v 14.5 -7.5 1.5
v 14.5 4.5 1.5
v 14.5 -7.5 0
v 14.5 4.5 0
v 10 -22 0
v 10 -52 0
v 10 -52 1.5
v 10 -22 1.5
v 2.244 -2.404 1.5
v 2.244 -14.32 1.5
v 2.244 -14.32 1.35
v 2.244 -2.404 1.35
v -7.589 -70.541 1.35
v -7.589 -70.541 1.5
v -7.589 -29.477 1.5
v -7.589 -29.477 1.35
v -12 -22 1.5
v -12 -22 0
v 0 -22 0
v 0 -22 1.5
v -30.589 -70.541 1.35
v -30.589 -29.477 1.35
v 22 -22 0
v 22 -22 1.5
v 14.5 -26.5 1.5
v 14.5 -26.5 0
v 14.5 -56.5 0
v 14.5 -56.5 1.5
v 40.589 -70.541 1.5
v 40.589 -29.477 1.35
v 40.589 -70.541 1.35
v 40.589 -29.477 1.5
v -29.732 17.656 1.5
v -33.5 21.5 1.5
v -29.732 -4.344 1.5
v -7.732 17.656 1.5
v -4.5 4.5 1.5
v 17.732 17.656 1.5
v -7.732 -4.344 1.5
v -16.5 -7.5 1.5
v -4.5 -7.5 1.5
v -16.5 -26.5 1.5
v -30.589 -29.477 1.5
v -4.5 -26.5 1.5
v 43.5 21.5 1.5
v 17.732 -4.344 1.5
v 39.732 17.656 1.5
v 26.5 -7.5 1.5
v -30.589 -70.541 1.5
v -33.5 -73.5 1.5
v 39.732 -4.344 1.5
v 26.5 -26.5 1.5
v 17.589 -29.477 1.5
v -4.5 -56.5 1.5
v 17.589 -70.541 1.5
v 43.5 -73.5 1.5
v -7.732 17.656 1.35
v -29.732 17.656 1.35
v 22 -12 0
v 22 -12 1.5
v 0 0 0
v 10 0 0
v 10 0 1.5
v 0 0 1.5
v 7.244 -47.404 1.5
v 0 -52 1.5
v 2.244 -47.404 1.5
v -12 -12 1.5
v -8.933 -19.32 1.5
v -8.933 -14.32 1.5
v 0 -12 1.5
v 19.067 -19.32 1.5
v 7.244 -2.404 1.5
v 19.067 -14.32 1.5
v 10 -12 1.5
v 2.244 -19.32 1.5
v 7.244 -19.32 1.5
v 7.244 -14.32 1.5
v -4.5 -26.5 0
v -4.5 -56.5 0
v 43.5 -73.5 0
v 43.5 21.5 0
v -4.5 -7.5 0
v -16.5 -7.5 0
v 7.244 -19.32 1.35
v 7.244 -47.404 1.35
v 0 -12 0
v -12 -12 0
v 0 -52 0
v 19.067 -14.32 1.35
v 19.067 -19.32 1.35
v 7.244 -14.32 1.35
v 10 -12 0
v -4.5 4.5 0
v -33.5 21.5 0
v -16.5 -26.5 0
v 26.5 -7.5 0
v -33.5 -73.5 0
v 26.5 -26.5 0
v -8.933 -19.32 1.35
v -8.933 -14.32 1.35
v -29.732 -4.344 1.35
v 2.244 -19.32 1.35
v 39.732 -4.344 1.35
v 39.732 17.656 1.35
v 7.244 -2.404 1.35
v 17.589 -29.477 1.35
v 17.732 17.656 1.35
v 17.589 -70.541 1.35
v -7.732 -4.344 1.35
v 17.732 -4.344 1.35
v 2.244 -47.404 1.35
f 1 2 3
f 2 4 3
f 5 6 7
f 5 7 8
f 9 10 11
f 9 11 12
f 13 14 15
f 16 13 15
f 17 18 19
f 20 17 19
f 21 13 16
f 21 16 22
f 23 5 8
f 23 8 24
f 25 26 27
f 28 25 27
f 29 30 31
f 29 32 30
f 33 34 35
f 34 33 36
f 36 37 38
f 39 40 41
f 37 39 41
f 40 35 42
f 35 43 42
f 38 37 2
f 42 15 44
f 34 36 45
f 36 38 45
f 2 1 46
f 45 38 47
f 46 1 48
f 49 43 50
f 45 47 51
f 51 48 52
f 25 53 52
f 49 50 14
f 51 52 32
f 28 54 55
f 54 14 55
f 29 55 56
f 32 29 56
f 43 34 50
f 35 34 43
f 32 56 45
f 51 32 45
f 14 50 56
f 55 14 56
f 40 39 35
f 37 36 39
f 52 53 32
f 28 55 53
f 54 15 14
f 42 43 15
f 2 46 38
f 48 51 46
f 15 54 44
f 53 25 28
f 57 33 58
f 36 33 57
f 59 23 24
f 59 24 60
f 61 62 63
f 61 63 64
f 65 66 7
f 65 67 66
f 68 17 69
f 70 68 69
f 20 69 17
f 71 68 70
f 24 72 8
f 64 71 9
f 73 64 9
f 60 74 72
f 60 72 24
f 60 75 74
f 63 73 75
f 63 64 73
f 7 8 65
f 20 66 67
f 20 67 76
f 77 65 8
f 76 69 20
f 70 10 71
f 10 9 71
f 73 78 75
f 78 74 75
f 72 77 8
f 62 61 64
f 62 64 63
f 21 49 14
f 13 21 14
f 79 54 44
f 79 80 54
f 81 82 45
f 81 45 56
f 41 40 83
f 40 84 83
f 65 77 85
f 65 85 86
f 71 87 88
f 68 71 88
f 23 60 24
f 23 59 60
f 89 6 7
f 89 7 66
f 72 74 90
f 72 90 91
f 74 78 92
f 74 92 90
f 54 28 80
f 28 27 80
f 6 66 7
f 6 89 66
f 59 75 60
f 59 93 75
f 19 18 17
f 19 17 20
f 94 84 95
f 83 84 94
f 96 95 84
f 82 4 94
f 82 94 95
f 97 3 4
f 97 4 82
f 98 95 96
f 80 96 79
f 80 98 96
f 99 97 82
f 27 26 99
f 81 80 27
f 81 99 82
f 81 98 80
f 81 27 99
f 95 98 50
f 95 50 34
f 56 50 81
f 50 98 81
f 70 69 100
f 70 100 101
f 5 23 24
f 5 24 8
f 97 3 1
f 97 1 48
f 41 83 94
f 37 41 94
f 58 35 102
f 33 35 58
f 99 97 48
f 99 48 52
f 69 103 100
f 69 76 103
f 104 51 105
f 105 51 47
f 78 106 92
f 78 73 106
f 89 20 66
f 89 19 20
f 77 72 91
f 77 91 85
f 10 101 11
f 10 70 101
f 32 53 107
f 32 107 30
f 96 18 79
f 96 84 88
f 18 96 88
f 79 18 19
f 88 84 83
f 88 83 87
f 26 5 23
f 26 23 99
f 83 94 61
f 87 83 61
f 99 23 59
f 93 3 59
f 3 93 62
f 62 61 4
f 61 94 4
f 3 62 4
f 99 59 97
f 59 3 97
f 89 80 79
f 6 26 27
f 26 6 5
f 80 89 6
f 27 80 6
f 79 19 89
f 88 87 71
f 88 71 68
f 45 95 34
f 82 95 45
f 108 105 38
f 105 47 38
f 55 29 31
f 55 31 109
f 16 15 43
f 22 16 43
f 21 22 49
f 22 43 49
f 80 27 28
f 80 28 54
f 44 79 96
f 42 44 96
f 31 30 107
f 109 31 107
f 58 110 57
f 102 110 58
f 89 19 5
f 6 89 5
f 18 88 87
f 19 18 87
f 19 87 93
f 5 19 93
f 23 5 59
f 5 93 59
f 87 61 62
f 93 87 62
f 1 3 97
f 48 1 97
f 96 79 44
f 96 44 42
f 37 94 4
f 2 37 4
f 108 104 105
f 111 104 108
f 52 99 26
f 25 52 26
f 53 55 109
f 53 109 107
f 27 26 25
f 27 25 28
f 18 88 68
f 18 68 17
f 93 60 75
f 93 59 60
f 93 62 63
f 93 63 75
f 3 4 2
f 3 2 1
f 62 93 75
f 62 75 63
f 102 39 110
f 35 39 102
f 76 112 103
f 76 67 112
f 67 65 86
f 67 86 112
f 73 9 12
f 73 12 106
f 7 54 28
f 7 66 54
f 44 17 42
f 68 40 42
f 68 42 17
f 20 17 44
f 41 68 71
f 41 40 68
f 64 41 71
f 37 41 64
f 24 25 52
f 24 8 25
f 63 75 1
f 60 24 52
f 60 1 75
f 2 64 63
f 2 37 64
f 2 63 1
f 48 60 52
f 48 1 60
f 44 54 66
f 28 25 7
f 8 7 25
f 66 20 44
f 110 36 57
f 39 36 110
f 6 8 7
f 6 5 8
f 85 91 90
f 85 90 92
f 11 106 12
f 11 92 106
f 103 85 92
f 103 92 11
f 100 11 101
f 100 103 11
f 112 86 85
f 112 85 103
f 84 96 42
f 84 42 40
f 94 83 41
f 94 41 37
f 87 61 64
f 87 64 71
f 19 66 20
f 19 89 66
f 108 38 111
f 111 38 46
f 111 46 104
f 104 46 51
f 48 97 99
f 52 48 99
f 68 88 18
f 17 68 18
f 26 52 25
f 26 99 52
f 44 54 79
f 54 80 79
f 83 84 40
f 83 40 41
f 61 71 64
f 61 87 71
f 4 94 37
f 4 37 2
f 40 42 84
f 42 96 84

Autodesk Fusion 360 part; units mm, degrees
sketch "Sketch1" plane through (0, 0, 0) normal (0, 0, 1) x (1, 0, 0)
  line L0 (0, 0) -> (10, 0)
  line L1 (10, 0) -> (10, -12)
  line L2 (10, -12) -> (0, -12)
  line L3 (0, -12) -> (0, 0)
  line L4 (0, -12) -> (-12, -12)
  line L5 (-12, -12) -> (-12, -22)
  line L6 (-12, -22) -> (0, -22)
  line L7 (0, -22) -> (0, -12)
  line L8 (10, -12) -> (22, -12)
  line L9 (22, -12) -> (22, -22)
  line L10 (22, -22) -> (10, -22)
  line L11 (10, -22) -> (10, -12)
  line L12 (0, -22) -> (10, -22)
  line L13 (10, -22) -> (10, -52)
  line L14 (10, -52) -> (0, -52)
  line L15 (0, -52) -> (0, -22)
  dimension "d1" = 10
  dimension "d2" = 12
  dimension "d3" = 12
  dimension "d4" = 10
  dimension "d5" = 12
  dimension "d6" = 10
  dimension "d7" = 30
extrude "Extrude1" add sketch "Sketch1" along normal blind 1.5 makes body 1
sketch "Sketch2" plane through (0, 0, 0) normal (0, 0, -1) x (1, 0, 0)
  line L0 (-12, 12) -> (0, 12)
  line L1 (0, 12) -> (0, 0)
  line L2 (0, 0) -> (10, 0)
  line L3 (10, 0) -> (10, 12)
  line L4 (10, 12) -> (22, 12)
  line L5 (22, 12) -> (22, 22)
  line L6 (22, 22) -> (10, 22)
  line L7 (10, 22) -> (10, 52)
  line L8 (10, 52) -> (0, 52)
  line L9 (0, 52) -> (0, 22)
  line L10 (0, 22) -> (-12, 22)
  line L11 (-12, 22) -> (-12, 12)
  line L12 (26.5, 7.5) -> (26.5, 26.5)
  line L13 (26.5, 26.5) -> (14.5, 26.5)
  line L14 (14.5, 26.5) -> (14.5, 56.5)
  line L15 (14.5, 56.5) -> (-4.5, 56.5)
  line L16 (-4.5, 56.5) -> (-4.5, 26.5)
  line L17 (-4.5, 26.5) -> (-16.5, 26.5)
  line L18 (-16.5, 26.5) -> (-16.5, 7.5)
  line L19 (-16.5, 7.5) -> (-4.5, 7.5)
  line L20 (-4.5, 7.5) -> (-4.5, -4.5)
  line L21 (-4.5, -4.5) -> (14.5, -4.5)
  line L22 (14.5, -4.5) -> (14.5, 7.5)
  line L23 (14.5, 7.5) -> (26.5, 7.5)
  line L24 (-4.5, -4.5) -> (-4.5, -21.5)
  line L25 (14.5, 56.5) -> (14.5, 73.5)
  line L26 (14.5, 73.5) -> (43.5, 73.5)
  line L27 (-4.5, -21.5) -> (-33.5, -21.5)
  line L28 (-33.5, -21.5) -> (43.5, -21.5)
  line L29 (43.5, -21.5) -> (43.5, 73.5)
  line L30 (43.5, 73.5) -> (-33.5, 73.5)
  line L31 (-33.5, 73.5) -> (-33.5, -21.5)
  dimension "d10" = 4.5
  dimension "d11" = 17
  dimension "d13" = 17
  dimension "d14" = 29
  dimension "d15" = 29
extrude "Extrude2" add sketch "Sketch2" against normal blind 1.5 separate body contours L12 L13 L14 L21 L22 L23 L24 L25 L26 L28 L29 L30 | L15 L16 L17 L18 L19 L20 L24 L25 L27 L28 L30 L31 makes body 2
sketch "Sketch3" plane through (0, 0, 1.5) normal (0, 0, 1) x (-1, 0, 0)
  line L0 (-14.5, 7.5) -> (-26.5, 7.5)
  line L1 (-26.5, 7.5) -> (-26.5, 26.5)
  line L2 (-26.5, 26.5) -> (-14.5, 26.5)
  line L3 (-14.5, 26.5) -> (-14.5, 56.5)
  line L4 (-14.5, 56.5) -> (4.5, 56.5)
  line L5 (4.5, 56.5) -> (4.5, 26.5)
  line L6 (4.5, 26.5) -> (16.5, 26.5)
  line L7 (16.5, 26.5) -> (16.5, 7.5)
  line L8 (16.5, 7.5) -> (4.5, 7.5)
  line L9 (4.5, 7.5) -> (4.5, -4.5)
  line L10 (4.5, -4.5) -> (-14.5, -4.5)
  line L11 (-14.5, -4.5) -> (-14.5, 7.5)
  line L12 (33.5, -21.5) -> (33.5, 73.5)
  line L13 (33.5, 73.5) -> (-43.5, 73.5)
  line L14 (-43.5, 73.5) -> (-43.5, -21.5)
  line L15 (-43.5, -21.5) -> (33.5, -21.5)
  line L16 (7.5893, 29.4773) -> (30.5893, 29.4773)
  line L17 (30.5893, 29.4773) -> (30.5893, 70.5409)
  line L18 (30.5893, 70.5409) -> (7.5893, 70.5409)
  line L19 (7.5893, 70.5409) -> (7.5893, 29.4773)
  line L20 (7.732, 4.3436) -> (29.732, 4.3436)
  line L21 (29.732, 4.3436) -> (29.732, -17.6564)
  line L22 (29.732, -17.6564) -> (7.732, -17.6564)
  line L23 (7.732, -17.6564) -> (7.732, 4.3436)
  line L24 (-5, -4.5) -> (-5, -13.4842)
  line L25 (8.9329, 14.3198) -> (-19.0671, 14.3198)
  line L26 (-19.0671, 14.3198) -> (-19.0671, 19.3198)
  line L27 (-19.0671, 19.3198) -> (8.9329, 19.3198)
  line L28 (8.9329, 19.3198) -> (8.9329, 14.3198)
  line L29 (-2.2442, 2.4038) -> (-7.2442, 2.4038)
  line L30 (-7.2442, 2.4038) -> (-7.2442, 47.4038)
  line L31 (-7.2442, 47.4038) -> (-2.2442, 47.4038)
  line L32 (-2.2442, 47.4038) -> (-2.2442, 2.4038)
  line L33 (-17.732, 4.3436) -> (-39.732, 4.3436)
  line L34 (-39.732, 4.3436) -> (-39.732, -17.6564)
  line L35 (-39.732, -17.6564) -> (-17.732, -17.6564)
  line L36 (-17.732, -17.6564) -> (-17.732, 4.3436)
  line L37 (-17.5893, 29.4773) -> (-40.5893, 29.4773)
  line L38 (-17.5893, 70.5409) -> (-17.5893, 29.4773)
  line L39 (-40.5893, 29.4773) -> (-40.5893, 70.5409)
  line L40 (-40.5893, 70.5409) -> (-17.5893, 70.5409)
  dimension "d18" = 23
  dimension "d19" = 22
  dimension "d20" = 22
  dimension "d21" = 28
  dimension "d22" = 5
  dimension "d23" = 5
  dimension "d24" = 45
extrude "Extrude3" cut sketch "Sketch3" against normal blind 0.15 contours L16 L17 L18 L19 | L20 L21 L22 L23 | L25 L27 L28 L32 | L25 L29 L30 L32 | L25 L27 L30 L32 | L25 L26 L27 L30 | L27 L30 L31 L32 | L33 L34 L35 L36 | L37 L38 L39 L40 bodies 1 2
sketch "Sketch4" plane through (0, 0, 0) normal (0, 0, 1) x (1, 0, 0)
  line L0 (0, -12) -> (-12, -12)
  line L1 (0, 0) -> (0, -12)
  line L2 (10, 0) -> (0, 0)
  line L3 (7.2442, -19.3198) -> (7.2442, -47.4038)
  line L4 (7.2442, -47.4038) -> (2.2442, -47.4038)
  line L5 (2.2442, -47.4038) -> (2.2442, -19.3198)
  line L6 (2.2442, -19.3198) -> (-8.9329, -19.3198)
  line L7 (-8.9329, -19.3198) -> (-8.9329, -14.3198)
  line L8 (-8.9329, -14.3198) -> (2.2442, -14.3198)
  line L9 (2.2442, -14.3198) -> (2.2442, -2.4038)
  line L10 (2.2442, -2.4038) -> (7.2442, -2.4038)
  line L11 (7.2442, -2.4038) -> (7.2442, -14.3198)
  line L12 (7.2442, -14.3198) -> (19.0671, -14.3198)
  line L13 (19.0671, -14.3198) -> (19.0671, -19.3198)
  line L14 (19.0671, -19.3198) -> (7.2442, -19.3198)
  line L15 (0, -12) -> (-12, -12)
  line L16 (-12, -12) -> (-12, -22)
  line L17 (-12, -22) -> (0, -22)
  line L18 (0, -22) -> (0, -52)
  line L19 (0, -52) -> (10, -52)
  line L20 (10, -52) -> (10, -22)
  line L21 (10, -22) -> (22, -22)
  line L22 (22, -22) -> (22, -12)
  line L23 (22, -12) -> (10, -12)
  line L24 (10, -12) -> (10, 0)
  line L25 (10, 0) -> (0, 0)
  line L26 (0, 0) -> (0, -12)
  line L27 (39.732, -4.3436) -> (17.732, -4.3436)
  line L28 (17.732, -4.3436) -> (17.732, 17.6564)
  line L29 (17.732, 17.6564) -> (39.732, 17.6564)
  line L30 (39.732, 17.6564) -> (39.732, -4.3436)
  line L31 (-30.5893, -29.4773) -> (-7.5893, -29.4773)
  line L32 (-7.5893, -29.4773) -> (-7.5893, -70.5409)
  line L33 (-7.5893, -70.5409) -> (-30.5893, -70.5409)
  line L34 (-30.5893, -70.5409) -> (-30.5893, -29.4773)
  line L35 (-29.732, -4.3436) -> (-29.732, 17.6564)
  line L36 (-29.732, 17.6564) -> (-7.732, 17.6564)
  line L37 (-7.732, 17.6564) -> (-7.732, -4.3436)
  line L38 (-7.732, -4.3436) -> (-29.732, -4.3436)
  line L39 (17.5893, -29.4773) -> (40.5893, -29.4773)
  line L40 (40.5893, -29.4773) -> (40.5893, -70.5409)
  line L41 (40.5893, -70.5409) -> (17.5893, -70.5409)
  line L42 (17.5893, -70.5409) -> (17.5893, -29.4773)
  line L43 (14.5, -7.5) -> (26.5, -7.5)
  line L44 (26.5, -7.5) -> (26.5, -26.5)
  line L45 (26.5, -26.5) -> (14.5, -26.5)
  line L46 (14.5, -26.5) -> (14.5, -56.5)
  line L47 (14.5, -56.5) -> (-4.5, -56.5)
  line L48 (-4.5, -56.5) -> (-4.5, -26.5)
  line L49 (-4.5, -26.5) -> (-16.5, -26.5)
  line L50 (-16.5, -26.5) -> (-16.5, -7.5)
  line L51 (-16.5, -7.5) -> (-4.5, -7.5)
  line L52 (-4.5, -7.5) -> (-4.5, 4.5)
  line L53 (-4.5, 4.5) -> (14.5, 4.5)
  line L54 (14.5, 4.5) -> (14.5, -7.5)
  line L55 (-33.5, 21.5) -> (-33.5, -73.5)
  line L56 (-33.5, -73.5) -> (43.5, -73.5)
  line L57 (43.5, -73.5) -> (43.5, 21.5)
  line L58 (43.5, 21.5) -> (-33.5, 21.5)
extrude "Extrude4" add sketch "Sketch4" along normal blind 1.5 separate body contours L43 L44 L45 L46 L47 L48 L49 L50 L51 L52 L53 L54 makes body 3
equation "d13 = d11"
equation "d14 = d13 + 12 mm"
equation "d15 = d11 + 12 mm"
